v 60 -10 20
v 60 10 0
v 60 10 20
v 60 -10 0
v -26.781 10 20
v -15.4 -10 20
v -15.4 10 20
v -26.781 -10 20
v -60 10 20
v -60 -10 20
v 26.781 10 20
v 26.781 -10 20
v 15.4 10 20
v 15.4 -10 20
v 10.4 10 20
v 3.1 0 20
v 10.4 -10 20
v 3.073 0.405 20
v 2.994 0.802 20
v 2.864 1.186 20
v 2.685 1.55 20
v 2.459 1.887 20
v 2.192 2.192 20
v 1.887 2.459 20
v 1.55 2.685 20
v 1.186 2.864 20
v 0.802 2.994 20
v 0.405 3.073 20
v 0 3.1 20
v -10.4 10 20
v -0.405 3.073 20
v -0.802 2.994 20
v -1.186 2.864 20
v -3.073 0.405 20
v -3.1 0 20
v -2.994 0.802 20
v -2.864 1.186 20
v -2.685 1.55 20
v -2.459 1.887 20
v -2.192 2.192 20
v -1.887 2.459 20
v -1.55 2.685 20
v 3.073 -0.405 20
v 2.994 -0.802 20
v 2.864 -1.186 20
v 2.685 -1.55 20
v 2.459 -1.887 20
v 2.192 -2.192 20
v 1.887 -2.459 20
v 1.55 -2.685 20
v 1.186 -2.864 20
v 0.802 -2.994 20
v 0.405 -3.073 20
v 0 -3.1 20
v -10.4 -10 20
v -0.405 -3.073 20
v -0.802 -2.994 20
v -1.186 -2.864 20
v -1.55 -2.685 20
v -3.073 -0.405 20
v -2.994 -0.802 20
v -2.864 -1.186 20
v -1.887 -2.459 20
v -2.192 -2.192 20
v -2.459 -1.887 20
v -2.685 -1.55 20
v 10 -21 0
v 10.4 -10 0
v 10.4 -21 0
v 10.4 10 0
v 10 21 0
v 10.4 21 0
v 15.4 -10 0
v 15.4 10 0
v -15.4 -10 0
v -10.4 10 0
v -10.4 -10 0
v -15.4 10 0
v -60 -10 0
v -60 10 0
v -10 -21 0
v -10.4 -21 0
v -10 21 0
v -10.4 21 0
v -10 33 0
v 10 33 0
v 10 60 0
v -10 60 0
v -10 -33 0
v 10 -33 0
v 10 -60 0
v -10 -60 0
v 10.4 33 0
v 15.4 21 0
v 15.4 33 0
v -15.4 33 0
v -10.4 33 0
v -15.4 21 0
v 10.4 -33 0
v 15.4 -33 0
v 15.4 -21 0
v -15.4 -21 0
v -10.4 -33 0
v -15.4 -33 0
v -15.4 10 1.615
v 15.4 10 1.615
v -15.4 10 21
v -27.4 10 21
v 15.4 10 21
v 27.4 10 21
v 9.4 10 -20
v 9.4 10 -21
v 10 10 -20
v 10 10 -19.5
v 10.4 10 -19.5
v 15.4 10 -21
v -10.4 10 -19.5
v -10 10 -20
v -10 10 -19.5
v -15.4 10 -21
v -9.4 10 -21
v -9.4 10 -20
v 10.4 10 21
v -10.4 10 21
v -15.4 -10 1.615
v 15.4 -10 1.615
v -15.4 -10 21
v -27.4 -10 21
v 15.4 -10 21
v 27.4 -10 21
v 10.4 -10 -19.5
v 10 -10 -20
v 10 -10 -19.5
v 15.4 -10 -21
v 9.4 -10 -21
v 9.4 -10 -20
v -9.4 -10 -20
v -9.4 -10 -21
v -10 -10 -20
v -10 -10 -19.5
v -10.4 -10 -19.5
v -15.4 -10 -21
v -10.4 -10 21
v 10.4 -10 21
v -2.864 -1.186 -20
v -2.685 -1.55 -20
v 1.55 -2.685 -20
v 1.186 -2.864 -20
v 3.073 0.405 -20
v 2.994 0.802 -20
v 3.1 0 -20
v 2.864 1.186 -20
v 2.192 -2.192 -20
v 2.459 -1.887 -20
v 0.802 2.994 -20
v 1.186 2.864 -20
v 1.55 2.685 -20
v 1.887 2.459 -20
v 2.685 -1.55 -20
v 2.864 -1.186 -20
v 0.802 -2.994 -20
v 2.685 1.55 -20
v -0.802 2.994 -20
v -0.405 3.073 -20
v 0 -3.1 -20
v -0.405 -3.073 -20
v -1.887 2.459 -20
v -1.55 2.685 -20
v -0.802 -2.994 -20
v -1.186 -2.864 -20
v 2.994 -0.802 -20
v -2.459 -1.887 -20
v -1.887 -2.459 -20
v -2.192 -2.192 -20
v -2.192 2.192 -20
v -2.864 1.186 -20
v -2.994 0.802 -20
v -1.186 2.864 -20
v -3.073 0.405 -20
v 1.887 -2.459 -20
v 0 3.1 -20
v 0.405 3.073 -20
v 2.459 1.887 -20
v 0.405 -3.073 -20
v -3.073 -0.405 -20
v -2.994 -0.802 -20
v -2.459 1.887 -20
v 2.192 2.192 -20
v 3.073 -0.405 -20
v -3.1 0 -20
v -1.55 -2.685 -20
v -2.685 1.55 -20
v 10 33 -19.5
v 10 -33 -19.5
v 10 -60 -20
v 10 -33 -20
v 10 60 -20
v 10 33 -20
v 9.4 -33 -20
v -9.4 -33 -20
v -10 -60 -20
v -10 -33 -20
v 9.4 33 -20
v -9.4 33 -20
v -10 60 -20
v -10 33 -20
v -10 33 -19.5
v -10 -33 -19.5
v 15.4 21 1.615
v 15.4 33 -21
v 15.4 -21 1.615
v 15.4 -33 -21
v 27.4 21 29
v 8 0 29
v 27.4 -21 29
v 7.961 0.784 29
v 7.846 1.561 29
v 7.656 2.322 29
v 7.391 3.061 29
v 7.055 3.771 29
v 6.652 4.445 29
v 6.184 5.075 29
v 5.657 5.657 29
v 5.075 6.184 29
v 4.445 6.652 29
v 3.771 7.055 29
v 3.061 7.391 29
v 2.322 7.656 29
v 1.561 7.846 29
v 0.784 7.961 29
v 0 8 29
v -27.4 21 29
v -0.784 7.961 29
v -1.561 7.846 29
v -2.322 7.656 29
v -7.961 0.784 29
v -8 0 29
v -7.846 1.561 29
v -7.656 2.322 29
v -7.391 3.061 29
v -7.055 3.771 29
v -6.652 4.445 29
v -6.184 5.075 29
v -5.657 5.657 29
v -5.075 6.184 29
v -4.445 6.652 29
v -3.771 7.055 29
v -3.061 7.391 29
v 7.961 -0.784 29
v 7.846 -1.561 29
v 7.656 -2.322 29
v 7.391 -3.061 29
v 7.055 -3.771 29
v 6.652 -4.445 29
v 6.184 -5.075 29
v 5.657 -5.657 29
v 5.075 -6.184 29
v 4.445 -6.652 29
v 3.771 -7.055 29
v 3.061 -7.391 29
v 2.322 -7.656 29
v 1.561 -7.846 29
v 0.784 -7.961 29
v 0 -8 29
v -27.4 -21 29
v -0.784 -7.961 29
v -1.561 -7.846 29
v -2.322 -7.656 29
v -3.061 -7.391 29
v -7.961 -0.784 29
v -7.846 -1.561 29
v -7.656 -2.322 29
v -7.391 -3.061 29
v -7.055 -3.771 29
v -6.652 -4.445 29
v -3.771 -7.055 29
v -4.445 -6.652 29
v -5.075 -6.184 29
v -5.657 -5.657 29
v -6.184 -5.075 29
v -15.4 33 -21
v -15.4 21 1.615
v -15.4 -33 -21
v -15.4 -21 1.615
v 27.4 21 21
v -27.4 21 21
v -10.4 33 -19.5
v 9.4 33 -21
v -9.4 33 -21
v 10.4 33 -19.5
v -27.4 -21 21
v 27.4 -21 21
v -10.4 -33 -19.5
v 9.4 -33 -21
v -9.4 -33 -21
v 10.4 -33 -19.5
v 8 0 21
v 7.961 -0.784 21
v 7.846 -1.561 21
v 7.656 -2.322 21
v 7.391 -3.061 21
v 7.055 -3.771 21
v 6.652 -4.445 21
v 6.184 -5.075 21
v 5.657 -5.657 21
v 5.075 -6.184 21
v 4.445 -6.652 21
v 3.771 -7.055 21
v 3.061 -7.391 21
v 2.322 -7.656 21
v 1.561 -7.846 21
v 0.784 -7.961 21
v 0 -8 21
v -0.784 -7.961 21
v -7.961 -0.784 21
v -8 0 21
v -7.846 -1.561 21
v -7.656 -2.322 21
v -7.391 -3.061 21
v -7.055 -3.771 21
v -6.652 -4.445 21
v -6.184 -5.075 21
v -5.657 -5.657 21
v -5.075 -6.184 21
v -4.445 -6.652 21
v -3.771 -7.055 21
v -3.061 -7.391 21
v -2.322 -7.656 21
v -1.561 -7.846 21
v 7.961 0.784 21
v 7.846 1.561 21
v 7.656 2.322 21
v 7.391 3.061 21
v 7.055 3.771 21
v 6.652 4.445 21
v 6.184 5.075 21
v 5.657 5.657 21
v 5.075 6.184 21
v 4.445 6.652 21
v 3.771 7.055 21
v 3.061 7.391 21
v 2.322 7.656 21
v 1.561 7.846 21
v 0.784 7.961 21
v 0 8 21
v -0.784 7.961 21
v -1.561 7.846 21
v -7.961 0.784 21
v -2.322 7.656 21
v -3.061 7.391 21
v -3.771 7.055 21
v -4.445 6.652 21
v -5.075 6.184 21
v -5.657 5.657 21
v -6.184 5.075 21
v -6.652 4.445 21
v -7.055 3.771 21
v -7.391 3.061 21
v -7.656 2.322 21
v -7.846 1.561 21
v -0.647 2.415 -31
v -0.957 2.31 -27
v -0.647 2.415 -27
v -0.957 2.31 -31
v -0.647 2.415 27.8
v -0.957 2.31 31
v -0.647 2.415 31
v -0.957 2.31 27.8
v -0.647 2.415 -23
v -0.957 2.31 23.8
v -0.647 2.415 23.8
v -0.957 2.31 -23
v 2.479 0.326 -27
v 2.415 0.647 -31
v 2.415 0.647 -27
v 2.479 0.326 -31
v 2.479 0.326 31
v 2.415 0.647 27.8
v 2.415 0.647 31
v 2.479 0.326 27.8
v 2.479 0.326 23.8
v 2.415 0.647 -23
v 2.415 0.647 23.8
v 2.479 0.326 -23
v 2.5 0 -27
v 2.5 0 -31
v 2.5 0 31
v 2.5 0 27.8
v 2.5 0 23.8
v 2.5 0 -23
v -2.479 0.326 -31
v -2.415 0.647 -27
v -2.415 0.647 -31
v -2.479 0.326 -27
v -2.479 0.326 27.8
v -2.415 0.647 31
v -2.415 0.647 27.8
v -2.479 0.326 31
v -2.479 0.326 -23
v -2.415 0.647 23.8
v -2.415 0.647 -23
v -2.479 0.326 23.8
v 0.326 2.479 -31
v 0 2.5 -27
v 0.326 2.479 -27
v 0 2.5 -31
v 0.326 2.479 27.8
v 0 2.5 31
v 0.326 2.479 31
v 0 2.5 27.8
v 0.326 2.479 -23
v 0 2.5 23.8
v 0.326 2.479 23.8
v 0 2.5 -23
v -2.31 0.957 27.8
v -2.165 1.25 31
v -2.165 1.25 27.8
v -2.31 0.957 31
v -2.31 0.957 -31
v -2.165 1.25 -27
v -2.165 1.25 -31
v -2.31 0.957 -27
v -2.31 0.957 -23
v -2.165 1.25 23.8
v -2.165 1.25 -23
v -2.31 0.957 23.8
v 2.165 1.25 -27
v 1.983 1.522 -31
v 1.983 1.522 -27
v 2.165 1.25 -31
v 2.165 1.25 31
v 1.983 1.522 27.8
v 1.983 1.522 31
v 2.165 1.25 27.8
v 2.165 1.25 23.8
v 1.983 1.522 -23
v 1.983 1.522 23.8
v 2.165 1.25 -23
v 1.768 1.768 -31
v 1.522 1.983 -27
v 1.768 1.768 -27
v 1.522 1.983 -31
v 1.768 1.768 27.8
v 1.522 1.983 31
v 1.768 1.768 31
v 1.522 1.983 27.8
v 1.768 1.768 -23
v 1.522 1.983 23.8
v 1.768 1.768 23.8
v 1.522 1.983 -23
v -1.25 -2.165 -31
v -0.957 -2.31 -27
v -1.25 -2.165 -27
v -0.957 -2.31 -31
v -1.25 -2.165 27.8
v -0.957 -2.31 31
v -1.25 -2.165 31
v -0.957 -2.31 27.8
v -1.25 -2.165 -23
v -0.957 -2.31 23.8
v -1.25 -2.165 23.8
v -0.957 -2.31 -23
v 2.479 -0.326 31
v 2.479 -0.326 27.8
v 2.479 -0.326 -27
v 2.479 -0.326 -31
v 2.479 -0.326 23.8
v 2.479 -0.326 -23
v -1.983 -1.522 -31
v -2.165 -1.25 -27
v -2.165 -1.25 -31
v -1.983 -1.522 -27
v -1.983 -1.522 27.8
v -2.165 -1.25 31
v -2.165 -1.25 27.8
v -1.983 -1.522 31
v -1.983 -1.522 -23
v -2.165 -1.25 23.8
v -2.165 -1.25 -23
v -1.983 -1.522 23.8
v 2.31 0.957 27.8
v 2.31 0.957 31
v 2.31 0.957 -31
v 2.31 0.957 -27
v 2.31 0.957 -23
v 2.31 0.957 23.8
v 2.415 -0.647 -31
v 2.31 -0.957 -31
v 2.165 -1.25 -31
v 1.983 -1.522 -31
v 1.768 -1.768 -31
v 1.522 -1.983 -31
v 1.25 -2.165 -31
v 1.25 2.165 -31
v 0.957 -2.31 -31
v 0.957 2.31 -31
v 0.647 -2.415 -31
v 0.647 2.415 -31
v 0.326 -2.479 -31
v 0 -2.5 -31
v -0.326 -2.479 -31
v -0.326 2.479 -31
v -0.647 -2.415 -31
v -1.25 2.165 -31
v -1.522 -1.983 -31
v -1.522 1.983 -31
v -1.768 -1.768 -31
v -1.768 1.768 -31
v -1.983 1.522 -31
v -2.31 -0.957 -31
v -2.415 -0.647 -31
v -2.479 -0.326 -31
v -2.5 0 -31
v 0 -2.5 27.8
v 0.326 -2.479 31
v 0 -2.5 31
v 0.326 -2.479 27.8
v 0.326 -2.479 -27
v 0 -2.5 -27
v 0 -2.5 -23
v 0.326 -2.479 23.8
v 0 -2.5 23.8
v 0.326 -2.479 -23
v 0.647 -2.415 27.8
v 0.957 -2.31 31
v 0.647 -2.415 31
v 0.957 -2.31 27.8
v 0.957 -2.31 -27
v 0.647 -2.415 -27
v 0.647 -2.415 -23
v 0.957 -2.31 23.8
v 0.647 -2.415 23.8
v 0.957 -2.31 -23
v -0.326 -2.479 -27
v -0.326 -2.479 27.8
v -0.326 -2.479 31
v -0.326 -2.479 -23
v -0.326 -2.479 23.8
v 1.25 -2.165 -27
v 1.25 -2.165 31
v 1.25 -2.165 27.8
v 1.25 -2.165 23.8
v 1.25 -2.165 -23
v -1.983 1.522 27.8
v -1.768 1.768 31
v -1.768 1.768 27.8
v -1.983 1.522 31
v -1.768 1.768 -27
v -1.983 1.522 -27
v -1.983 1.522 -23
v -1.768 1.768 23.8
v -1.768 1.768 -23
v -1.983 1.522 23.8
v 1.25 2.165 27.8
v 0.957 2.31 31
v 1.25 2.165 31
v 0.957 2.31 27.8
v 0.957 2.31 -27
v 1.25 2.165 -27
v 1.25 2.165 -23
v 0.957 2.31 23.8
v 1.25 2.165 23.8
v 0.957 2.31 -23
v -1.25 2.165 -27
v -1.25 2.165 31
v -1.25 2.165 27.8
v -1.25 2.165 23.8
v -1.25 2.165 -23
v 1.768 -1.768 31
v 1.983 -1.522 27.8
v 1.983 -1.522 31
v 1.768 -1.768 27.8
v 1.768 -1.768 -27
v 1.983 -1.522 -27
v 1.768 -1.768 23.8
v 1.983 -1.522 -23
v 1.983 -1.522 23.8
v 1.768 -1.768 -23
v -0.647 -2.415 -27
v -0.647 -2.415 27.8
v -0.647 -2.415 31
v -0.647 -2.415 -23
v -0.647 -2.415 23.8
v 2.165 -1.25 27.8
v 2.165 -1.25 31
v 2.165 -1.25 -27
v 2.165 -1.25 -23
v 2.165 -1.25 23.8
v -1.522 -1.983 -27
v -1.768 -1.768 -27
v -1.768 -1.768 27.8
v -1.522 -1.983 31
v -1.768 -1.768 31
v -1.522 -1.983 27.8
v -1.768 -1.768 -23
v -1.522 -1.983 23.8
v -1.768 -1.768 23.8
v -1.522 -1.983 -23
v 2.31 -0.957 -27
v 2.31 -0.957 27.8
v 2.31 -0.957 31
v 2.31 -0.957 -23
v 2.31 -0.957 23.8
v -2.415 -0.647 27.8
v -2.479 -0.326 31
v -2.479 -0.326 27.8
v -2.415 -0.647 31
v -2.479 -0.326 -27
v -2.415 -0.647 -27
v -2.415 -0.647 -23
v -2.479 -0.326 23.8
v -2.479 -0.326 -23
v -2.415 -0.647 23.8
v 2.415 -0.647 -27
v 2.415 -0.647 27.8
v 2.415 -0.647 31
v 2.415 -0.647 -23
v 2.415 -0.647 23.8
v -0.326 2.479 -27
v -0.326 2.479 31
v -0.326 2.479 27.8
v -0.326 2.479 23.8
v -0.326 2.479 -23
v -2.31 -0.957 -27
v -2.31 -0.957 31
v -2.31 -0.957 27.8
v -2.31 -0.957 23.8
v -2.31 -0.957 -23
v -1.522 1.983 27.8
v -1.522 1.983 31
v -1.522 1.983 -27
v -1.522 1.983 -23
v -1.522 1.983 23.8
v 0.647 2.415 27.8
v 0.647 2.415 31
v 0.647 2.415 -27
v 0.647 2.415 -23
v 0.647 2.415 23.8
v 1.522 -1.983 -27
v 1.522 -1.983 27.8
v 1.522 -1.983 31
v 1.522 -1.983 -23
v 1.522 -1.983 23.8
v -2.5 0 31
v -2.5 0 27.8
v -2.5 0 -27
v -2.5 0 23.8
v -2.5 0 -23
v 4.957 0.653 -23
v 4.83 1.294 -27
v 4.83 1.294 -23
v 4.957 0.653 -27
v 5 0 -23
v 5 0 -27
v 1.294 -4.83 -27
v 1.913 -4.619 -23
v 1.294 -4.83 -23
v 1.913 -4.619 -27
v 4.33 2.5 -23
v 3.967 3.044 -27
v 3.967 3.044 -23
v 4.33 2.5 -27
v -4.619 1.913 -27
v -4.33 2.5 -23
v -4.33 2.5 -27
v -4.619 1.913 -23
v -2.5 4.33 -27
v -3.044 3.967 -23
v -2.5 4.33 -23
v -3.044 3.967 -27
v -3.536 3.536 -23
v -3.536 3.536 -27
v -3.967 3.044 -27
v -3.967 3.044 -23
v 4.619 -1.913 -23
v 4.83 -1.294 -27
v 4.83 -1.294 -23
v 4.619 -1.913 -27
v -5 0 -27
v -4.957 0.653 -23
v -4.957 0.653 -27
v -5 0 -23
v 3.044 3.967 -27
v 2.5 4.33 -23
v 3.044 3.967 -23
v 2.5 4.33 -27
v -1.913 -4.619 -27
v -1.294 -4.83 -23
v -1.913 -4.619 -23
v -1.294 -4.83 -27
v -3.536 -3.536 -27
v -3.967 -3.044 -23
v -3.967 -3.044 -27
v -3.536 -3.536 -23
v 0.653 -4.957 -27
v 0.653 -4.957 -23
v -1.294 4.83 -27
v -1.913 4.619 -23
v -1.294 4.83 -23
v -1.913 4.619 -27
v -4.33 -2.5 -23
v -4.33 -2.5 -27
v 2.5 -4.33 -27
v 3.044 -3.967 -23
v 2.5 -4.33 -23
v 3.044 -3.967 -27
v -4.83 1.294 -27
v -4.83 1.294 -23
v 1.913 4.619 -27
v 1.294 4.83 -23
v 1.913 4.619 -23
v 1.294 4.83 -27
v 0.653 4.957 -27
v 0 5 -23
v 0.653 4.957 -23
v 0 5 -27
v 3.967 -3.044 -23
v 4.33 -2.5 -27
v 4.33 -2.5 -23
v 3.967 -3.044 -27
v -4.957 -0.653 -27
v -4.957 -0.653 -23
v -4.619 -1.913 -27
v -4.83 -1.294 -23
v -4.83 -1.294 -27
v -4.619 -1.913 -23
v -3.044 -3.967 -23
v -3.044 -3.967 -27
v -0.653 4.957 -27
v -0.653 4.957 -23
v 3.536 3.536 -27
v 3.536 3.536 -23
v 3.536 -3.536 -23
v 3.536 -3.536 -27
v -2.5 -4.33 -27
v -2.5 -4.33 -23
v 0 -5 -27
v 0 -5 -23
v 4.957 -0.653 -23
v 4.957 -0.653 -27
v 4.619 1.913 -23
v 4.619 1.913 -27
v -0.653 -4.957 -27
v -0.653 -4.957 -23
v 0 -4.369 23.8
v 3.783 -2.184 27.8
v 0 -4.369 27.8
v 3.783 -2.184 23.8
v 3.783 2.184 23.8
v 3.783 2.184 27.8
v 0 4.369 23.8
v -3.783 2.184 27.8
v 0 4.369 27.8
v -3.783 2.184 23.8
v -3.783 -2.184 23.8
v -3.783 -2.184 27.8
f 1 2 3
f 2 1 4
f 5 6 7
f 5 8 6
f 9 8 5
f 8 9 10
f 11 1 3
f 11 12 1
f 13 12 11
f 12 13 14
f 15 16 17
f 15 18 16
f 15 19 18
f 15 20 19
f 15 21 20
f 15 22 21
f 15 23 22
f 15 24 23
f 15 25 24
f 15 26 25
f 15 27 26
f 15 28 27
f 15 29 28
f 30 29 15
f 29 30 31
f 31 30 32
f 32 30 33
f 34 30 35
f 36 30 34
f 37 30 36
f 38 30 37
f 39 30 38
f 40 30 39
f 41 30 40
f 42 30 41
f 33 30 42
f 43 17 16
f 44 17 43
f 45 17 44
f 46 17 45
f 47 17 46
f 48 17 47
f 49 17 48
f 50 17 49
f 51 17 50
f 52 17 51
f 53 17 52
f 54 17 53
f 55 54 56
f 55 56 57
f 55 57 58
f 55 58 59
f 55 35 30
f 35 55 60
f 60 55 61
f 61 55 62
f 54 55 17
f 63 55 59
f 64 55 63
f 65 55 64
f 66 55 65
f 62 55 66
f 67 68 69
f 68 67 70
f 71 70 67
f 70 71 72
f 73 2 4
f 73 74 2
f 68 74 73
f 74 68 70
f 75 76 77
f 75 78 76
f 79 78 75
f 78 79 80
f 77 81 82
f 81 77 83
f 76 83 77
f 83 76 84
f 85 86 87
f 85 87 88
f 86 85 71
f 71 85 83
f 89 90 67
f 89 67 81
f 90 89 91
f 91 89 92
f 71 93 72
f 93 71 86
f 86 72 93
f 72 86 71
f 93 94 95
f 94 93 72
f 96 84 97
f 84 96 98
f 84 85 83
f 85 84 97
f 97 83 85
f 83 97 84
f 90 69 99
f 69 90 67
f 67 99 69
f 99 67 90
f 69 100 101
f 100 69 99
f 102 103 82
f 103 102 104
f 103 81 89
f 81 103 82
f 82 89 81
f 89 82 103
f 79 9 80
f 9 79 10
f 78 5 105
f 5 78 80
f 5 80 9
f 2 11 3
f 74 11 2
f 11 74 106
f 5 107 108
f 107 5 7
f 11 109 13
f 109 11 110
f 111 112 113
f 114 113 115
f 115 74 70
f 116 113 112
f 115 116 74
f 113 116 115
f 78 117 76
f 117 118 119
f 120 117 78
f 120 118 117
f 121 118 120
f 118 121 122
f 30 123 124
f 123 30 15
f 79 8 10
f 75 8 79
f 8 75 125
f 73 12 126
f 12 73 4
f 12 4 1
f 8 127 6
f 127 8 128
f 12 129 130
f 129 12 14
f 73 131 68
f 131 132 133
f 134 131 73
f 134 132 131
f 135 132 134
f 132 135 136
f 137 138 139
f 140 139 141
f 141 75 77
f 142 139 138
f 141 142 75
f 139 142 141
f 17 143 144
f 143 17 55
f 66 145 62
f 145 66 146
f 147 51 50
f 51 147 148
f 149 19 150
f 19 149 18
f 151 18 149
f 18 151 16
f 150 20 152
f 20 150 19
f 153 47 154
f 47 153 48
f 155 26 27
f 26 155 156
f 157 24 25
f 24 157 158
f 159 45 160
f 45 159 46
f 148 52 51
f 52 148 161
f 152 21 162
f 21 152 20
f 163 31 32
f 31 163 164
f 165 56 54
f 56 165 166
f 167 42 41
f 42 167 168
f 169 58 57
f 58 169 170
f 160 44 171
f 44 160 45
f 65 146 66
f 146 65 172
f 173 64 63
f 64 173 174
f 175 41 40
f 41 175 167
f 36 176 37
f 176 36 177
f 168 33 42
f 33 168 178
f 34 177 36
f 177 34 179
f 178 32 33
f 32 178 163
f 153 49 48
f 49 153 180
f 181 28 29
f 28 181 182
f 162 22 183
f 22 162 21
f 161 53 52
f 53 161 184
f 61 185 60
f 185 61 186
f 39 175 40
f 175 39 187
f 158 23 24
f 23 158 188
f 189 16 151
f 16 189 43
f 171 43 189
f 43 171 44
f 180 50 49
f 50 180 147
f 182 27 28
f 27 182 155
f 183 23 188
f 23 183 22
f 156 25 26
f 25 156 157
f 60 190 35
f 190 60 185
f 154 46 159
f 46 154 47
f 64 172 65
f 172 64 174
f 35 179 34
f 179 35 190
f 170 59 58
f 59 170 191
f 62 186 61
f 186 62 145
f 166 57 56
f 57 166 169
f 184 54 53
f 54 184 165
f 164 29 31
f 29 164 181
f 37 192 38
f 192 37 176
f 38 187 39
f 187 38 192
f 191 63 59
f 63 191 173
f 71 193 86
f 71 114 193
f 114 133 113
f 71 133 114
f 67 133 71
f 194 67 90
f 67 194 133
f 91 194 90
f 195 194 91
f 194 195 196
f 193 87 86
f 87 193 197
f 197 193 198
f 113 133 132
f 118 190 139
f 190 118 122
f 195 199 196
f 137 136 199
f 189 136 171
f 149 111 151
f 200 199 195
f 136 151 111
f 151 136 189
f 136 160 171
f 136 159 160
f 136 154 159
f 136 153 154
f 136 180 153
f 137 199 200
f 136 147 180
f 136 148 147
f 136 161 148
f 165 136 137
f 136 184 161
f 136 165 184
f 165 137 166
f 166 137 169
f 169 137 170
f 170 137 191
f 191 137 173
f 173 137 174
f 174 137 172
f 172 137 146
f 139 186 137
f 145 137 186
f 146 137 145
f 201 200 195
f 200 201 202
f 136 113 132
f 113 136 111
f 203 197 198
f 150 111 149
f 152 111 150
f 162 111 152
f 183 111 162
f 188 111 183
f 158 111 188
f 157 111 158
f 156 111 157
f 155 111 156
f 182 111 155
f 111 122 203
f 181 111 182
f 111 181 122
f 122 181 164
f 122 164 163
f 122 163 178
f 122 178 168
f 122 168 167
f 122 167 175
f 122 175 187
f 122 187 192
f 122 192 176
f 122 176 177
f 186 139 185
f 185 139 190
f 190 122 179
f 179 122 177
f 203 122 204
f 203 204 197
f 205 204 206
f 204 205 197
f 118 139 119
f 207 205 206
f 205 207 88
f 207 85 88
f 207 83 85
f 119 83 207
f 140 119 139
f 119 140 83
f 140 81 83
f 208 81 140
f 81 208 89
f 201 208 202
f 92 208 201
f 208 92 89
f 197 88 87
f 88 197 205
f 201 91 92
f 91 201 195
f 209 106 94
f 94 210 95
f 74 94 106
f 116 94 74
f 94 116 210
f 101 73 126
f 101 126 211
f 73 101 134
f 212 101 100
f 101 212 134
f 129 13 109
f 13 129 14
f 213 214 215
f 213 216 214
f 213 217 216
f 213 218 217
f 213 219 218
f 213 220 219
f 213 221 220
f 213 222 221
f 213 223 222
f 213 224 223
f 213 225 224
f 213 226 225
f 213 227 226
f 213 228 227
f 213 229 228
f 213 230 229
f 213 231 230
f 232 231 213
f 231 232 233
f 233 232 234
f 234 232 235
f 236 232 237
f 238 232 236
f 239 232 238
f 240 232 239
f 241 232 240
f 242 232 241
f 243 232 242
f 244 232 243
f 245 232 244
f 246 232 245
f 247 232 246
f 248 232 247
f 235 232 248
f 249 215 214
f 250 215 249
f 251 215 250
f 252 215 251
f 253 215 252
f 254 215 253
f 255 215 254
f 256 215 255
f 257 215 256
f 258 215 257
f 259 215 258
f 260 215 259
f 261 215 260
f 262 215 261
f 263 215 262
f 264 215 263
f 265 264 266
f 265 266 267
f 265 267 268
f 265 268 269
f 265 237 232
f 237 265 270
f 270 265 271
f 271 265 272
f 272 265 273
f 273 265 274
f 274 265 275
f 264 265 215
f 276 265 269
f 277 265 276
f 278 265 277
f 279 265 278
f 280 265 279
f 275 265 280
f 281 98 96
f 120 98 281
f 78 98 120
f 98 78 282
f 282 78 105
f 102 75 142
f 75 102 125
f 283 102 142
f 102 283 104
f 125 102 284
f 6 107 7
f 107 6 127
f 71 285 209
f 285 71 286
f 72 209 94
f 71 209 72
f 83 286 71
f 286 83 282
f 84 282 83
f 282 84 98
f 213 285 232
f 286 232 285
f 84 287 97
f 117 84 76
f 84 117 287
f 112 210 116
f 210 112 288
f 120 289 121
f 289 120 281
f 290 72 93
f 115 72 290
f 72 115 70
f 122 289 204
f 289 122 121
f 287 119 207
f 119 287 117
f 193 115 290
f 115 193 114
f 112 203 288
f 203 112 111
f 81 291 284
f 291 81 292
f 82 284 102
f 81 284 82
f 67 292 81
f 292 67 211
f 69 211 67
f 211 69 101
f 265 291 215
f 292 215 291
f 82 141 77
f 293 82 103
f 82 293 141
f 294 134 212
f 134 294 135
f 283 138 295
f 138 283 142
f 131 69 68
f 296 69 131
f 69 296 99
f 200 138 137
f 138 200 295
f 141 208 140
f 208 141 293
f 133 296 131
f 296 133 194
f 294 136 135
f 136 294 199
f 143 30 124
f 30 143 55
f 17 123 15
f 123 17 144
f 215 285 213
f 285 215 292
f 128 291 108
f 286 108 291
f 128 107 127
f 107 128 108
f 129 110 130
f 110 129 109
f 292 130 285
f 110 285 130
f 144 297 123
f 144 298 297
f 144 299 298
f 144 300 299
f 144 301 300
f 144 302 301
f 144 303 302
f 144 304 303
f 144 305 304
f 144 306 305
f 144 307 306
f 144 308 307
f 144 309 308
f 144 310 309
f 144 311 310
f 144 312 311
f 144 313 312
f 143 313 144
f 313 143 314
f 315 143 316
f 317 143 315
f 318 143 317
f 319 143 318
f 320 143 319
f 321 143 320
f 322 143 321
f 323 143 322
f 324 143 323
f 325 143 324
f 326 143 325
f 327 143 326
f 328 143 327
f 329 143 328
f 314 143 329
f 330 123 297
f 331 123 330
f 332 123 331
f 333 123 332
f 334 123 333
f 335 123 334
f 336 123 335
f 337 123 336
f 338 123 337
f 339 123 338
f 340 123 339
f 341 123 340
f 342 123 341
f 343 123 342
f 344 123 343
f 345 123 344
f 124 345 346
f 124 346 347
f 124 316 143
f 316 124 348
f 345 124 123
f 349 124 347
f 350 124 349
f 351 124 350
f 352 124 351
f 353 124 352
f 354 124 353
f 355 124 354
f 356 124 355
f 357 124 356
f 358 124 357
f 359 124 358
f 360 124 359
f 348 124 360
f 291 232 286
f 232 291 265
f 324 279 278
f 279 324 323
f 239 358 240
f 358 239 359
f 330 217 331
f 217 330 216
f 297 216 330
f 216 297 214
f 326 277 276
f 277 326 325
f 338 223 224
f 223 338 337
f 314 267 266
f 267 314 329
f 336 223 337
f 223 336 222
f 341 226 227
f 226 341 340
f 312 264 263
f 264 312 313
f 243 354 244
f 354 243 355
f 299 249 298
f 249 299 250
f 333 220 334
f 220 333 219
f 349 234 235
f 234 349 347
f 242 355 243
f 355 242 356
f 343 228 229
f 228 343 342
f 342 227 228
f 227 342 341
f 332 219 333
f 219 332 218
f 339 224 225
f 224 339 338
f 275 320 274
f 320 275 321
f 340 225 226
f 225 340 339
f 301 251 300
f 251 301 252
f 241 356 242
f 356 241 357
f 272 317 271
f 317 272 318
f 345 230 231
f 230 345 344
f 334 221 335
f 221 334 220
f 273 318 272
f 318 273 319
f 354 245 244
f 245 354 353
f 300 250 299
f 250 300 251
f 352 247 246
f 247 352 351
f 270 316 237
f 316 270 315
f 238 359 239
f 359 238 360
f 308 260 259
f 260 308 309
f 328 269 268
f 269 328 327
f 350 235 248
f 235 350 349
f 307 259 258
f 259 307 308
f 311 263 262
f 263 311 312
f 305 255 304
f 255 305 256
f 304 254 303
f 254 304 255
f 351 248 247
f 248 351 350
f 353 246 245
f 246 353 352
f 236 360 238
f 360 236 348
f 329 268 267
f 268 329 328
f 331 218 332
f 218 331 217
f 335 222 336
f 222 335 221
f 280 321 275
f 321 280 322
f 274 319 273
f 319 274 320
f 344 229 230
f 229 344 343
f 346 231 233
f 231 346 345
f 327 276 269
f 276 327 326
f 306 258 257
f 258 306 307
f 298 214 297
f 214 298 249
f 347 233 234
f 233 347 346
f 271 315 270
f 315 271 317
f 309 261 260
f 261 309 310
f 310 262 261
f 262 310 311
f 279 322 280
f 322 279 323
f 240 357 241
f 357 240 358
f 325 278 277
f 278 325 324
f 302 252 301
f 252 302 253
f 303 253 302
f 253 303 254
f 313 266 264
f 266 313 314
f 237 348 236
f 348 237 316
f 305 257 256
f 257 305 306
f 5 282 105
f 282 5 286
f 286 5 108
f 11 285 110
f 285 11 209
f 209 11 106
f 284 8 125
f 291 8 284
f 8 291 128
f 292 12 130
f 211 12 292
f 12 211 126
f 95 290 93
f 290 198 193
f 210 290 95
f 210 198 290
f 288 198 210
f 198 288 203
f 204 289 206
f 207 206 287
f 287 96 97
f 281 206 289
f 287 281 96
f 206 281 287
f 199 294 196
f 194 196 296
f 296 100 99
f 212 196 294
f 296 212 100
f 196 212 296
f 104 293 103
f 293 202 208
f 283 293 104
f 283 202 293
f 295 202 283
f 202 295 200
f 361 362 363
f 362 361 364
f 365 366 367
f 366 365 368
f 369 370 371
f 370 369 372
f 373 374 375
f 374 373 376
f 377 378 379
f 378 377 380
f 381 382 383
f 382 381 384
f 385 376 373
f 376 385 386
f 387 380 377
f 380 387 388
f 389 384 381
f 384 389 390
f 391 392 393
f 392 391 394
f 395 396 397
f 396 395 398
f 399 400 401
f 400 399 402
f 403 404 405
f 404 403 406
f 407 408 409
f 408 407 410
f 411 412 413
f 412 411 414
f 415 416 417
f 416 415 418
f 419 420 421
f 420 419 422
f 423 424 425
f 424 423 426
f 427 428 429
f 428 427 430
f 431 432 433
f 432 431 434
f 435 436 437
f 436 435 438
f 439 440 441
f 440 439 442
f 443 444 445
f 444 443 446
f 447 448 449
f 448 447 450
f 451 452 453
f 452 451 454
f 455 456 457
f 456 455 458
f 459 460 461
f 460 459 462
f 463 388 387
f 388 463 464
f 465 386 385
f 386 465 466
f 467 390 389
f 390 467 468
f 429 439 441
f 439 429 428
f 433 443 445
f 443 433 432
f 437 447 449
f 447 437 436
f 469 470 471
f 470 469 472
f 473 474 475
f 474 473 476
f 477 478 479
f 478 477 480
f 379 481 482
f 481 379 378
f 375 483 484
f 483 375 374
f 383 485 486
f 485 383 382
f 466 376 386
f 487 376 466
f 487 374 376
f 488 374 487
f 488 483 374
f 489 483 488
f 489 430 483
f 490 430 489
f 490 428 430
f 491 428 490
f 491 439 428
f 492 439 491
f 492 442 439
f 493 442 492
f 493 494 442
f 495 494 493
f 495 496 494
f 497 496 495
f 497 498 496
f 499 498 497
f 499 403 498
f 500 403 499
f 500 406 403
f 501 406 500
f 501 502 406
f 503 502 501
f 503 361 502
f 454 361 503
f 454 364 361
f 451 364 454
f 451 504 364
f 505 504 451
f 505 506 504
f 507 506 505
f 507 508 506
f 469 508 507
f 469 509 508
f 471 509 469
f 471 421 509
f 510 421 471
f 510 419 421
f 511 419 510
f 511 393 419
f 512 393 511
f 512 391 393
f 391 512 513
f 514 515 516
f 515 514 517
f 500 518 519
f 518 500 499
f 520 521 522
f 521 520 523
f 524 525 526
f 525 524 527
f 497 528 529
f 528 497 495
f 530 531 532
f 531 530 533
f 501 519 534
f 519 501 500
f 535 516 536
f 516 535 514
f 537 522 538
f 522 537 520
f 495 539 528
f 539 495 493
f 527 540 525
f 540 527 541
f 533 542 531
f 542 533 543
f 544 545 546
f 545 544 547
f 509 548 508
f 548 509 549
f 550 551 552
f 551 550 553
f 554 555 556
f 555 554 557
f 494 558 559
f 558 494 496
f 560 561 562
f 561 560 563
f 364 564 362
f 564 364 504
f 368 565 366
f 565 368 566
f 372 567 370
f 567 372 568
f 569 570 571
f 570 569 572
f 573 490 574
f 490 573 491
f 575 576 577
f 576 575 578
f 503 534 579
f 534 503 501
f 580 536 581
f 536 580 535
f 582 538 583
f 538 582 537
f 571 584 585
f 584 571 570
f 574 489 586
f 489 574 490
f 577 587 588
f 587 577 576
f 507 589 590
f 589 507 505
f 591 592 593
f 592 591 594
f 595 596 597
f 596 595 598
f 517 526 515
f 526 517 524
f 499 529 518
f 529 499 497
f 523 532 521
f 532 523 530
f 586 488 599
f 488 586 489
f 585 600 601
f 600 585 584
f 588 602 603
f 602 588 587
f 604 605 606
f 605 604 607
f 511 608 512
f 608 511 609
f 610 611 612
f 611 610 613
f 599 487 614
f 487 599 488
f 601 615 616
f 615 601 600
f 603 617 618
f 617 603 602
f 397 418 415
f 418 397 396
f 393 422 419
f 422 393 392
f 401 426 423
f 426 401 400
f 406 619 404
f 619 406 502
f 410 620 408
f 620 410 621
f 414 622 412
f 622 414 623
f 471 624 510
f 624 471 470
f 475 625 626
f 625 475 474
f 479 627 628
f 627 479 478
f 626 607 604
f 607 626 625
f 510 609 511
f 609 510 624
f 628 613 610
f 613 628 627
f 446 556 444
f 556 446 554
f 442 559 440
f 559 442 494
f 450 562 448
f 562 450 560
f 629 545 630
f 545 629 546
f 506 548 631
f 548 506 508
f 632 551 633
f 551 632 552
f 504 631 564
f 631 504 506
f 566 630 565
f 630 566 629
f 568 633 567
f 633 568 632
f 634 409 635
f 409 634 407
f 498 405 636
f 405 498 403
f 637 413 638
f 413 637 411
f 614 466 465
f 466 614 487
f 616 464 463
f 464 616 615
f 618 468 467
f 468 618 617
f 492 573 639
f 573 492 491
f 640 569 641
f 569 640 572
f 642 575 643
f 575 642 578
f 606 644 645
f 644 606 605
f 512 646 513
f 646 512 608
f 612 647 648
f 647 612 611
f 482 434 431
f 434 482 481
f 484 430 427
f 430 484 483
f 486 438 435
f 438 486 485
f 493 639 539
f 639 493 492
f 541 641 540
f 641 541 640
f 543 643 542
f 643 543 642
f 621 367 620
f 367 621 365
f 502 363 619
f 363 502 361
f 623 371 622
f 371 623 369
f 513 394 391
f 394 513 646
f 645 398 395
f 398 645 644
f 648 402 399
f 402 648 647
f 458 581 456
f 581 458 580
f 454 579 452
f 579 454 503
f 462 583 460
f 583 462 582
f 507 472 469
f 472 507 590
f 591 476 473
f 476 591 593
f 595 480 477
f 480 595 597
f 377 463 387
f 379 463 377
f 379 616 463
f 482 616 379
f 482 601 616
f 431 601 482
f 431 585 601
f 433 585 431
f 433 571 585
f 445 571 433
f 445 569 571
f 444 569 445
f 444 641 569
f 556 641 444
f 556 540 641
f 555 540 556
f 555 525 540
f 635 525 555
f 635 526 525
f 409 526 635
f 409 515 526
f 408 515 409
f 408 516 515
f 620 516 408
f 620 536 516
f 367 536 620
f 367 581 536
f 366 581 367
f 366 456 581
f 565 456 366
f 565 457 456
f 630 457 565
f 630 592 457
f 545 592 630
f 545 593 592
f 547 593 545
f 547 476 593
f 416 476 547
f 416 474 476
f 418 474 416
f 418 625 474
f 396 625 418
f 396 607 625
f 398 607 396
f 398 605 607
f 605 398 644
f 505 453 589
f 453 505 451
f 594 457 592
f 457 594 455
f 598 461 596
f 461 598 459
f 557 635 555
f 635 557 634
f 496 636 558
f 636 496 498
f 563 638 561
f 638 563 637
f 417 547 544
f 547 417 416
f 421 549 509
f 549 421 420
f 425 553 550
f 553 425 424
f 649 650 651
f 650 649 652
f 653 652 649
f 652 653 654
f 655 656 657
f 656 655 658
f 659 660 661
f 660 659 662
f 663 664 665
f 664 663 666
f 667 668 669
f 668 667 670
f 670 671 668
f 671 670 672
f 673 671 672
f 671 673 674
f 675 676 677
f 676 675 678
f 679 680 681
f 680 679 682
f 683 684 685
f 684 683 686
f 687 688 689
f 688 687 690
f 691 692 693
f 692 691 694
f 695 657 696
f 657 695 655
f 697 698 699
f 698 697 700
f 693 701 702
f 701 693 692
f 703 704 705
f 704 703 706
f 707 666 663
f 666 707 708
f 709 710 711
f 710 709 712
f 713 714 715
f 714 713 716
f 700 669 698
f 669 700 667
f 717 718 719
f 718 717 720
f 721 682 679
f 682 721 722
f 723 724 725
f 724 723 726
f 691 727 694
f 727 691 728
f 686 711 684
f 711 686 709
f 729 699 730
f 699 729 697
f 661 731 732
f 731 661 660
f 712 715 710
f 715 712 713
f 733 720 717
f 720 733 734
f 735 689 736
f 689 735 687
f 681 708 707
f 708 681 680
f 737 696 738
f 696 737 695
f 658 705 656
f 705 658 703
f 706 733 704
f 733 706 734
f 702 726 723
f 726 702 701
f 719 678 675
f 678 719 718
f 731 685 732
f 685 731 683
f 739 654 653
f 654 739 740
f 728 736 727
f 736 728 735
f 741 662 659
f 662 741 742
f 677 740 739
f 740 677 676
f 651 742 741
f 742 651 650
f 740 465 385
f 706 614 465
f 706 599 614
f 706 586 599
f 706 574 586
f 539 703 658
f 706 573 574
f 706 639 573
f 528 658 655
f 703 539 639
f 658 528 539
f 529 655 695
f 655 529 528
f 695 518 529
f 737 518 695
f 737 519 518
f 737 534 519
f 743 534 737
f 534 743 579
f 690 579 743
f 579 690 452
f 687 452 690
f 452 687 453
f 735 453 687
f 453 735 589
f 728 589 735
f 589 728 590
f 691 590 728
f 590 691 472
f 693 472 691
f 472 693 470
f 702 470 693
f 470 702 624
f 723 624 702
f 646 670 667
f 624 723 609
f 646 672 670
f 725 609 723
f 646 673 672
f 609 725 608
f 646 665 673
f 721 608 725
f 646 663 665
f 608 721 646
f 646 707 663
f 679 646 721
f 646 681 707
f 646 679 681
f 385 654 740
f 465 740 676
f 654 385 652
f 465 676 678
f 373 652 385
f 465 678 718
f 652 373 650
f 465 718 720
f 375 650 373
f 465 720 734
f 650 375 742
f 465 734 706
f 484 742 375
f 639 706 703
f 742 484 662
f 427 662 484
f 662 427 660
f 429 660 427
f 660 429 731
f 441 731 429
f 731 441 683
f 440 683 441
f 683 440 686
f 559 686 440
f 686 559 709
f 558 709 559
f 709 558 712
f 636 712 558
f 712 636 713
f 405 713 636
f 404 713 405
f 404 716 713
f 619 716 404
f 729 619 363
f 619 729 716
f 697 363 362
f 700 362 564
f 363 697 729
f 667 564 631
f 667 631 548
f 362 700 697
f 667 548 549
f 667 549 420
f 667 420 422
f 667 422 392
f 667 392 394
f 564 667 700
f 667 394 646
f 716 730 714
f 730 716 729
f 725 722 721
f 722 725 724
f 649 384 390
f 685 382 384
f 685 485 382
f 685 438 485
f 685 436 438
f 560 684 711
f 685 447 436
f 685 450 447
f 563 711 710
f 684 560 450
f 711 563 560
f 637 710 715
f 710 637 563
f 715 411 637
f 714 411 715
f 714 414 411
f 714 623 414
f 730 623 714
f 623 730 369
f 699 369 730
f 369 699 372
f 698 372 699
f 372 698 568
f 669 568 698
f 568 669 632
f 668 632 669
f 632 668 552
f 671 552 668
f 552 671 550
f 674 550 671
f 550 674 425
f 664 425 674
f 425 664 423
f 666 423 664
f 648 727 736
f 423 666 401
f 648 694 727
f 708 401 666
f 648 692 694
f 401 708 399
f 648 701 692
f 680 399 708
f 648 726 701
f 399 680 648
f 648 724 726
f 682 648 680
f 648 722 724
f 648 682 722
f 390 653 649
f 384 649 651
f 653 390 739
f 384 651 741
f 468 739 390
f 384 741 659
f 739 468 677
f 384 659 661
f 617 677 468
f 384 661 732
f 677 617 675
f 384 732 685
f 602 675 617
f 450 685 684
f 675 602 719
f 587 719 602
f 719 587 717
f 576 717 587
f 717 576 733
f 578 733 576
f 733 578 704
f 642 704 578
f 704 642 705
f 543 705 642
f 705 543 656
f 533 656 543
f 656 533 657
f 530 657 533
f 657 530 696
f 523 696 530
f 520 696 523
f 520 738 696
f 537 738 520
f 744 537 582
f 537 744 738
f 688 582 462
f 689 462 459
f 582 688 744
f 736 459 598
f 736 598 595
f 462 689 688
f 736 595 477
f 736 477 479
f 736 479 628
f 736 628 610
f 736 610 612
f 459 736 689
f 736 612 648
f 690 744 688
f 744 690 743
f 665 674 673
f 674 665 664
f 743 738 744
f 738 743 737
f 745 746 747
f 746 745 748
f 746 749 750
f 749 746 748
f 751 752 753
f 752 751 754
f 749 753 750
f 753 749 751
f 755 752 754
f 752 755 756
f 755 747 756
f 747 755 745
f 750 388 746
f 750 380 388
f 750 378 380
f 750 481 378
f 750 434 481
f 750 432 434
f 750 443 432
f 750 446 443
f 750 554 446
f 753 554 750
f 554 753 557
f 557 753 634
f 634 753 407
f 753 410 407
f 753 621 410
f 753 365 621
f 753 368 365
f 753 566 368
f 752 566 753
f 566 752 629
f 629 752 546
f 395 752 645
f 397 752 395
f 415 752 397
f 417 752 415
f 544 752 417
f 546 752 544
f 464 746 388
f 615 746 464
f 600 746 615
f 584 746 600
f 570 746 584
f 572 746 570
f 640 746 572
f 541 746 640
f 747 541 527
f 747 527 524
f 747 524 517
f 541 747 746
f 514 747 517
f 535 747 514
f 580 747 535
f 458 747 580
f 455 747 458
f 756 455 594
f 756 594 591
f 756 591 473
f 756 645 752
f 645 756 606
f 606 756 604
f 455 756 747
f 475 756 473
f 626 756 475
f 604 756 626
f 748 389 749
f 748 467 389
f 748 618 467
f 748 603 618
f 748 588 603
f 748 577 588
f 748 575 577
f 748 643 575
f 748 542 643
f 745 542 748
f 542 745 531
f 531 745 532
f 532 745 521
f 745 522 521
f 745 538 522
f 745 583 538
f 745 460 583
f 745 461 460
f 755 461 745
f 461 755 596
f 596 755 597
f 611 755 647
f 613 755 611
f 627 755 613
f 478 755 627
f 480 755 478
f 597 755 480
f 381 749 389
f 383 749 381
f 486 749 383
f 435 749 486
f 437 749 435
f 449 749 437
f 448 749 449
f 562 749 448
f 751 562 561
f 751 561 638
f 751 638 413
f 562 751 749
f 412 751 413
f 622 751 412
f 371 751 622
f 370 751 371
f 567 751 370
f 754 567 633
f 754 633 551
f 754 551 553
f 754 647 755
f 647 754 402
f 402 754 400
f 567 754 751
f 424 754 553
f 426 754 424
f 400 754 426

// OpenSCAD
// file: ../perpendicular-u-joint-guard-v1.4-full-nut-passage/full_nut_passage_guard.scad
// v1.4: keep the exact v1.3 body; remove the nut-pocket floor with one
// full-depth Ø16 cylindrical subtraction. Units: mm; Z positive upwards.
// Imported v1.3 geometry contains all four triangles and the lower hooks.
use <../perpendicular-u-joint-guard-v1.3-triangular-corner-fills/candidate_triangular_corner_fills.scad>;

$fn = 48;
PART = "clip";
nut_passage_d = 16.0;

module full_depth_nut_passage() {
    // Cutter extends z=-31..39, past the whole printed z=-21..29 envelope.
    // 64 facets match the existing Ø16 pocket, avoiding a stepped profile.
    translate([0, 0, 4])
        cylinder(d = nut_passage_d, h = 70, center = true, $fn = 64);
}

module guard_v1_4() {
    difference() {
        candidate_print_solid();
        full_depth_nut_passage();
    }
}

guard_v1_4();
// file: ../perpendicular-u-joint-guard-v1.3-triangular-corner-fills/candidate_triangular_corner_fills.scad
// Candidate v1.3: four triangular concave-corner fill blocks.
//
// Base: accepted v0.7 eaves12 geometry. v0.9/v1.0/v1.1/v1.2 are not
// imported. Each corner block is a real triangular prism: broad at the roof,
// tapering continuously toward z=0, and overlapping the U side wall.

use <../perpendicular-u-joint-guard-v0.7/perpendicular_double_u_guard.scad>;

$fn = 48;
PART = "candidate_iso";

// Explicit v0.7 interface values.
roof_x_outer = 27.4;       // accepted eaves12 roof: -27.4..+27.4
side_wall_x_outer = 15.4;  // existing side-wall outer edge
blue_tube_x_outer = 10.0;  // blue lower 20x20 tube half-width
plate_y_inner = 10.0;
plate_y_outer = 21.0;
plate_depth_y = plate_y_outer - plate_y_inner; // 11 mm per front/back U plate

// The top edge is 0.5 mm inside the roof volume (roof underside z=21), and
// the lower point enters the side wall by 1 mm in X.  The XZ area therefore
// has positive overlap at both ends, not edge-only contact.
triangle_top_z = 21.5;
triangle_bottom_z = 0.0;
triangle_roof_overlap_z = triangle_top_z - 21.0;
triangle_side_overlap_x = 1.0;
triangle_inner_x = side_wall_x_outer - triangle_side_overlap_x; // 14.4

// Bottom retaining-hook contract copied from v0.7 for explicit verification.
hook_height_z = 1.5;
u_bottom_z = -21.0;
hook_top_z = u_bottom_z + hook_height_z; // -19.5

assert(plate_depth_y == 11, "每个三角块的前后板深必须是 11 mm");
assert(triangle_top_z > 21 && triangle_bottom_z == 0,
       "三角块上端必须搭入屋檐、下端落到 z=0");
assert(triangle_inner_x > blue_tube_x_outer,
       "三角块下端不得进入蓝色方管 x=-10..+10 包络");
assert(triangle_side_overlap_x > 0 && triangle_roof_overlap_z > 0,
       "三角块必须与屋檐和侧墙都有正重叠");
assert(hook_height_z == 1.5 && u_bottom_z == -21 && hook_top_z == -19.5,
       "底部卡脚必须保持 z=-21..-19.5");

// A polygon in XZ is extruded only through the corresponding front/back U
// plate. The center y=-10..+10 passage remains open.
module triangular_fill_xz(points, yc) {
    translate([0, yc, 0])
        rotate([90, 0, 0])
            linear_extrude(height = plate_depth_y,
                           center = true,
                           convexity = 10)
                polygon(points = points);
}

module front_neg_x_triangle() {
    // -X roof end -> +X inward. Top wide, lower point at the side wall.
    triangular_fill_xz([
        [-roof_x_outer, 21.0],
        [-triangle_inner_x, triangle_top_z],
        [-triangle_inner_x, triangle_bottom_z]
    ], (plate_y_inner + plate_y_outer) / 2);
}

module front_pos_x_triangle() {
    // +X roof end -> -X inward. Mirrored triangle.
    triangular_fill_xz([
        [roof_x_outer, 21.0],
        [triangle_inner_x, triangle_top_z],
        [triangle_inner_x, triangle_bottom_z]
    ], (plate_y_inner + plate_y_outer) / 2);
}

module back_neg_x_triangle() {
    triangular_fill_xz([
        [-roof_x_outer, 21.0],
        [-triangle_inner_x, triangle_top_z],
        [-triangle_inner_x, triangle_bottom_z]
    ], -(plate_y_inner + plate_y_outer) / 2);
}

module back_pos_x_triangle() {
    triangular_fill_xz([
        [roof_x_outer, 21.0],
        [triangle_inner_x, triangle_top_z],
        [triangle_inner_x, triangle_bottom_z]
    ], -(plate_y_inner + plate_y_outer) / 2);
}

module front_two_triangular_fills() {
    union() {
        front_neg_x_triangle();
        front_pos_x_triangle();
    }
}

module back_two_triangular_fills() {
    union() {
        back_neg_x_triangle();
        back_pos_x_triangle();
    }
}

module all_four_triangular_fills() {
    union() {
        front_two_triangular_fills();
        back_two_triangular_fills();
    }
}

module candidate_print_solid() {
    // Final hole operation is deliberately after the complete four-block
    // union; this preserves a true Z through-hole and the round nut pocket.
    difference() {
        union() {
            double_u_clip();
            all_four_triangular_fills();
        }
        vertical_screw_relief();
    }
}

module candidate_clip() {
    candidate_print_solid();
}

module candidate_assembly_iso() {
    upper_long_tube();
    lower_cross_tube();
    color([0.96, 0.39, 0.08]) double_u_clip();
    color([0.86, 0.13, 0.08]) front_two_triangular_fills();
    color([0.62, 0.12, 0.52]) back_two_triangular_fills();
    vertical_joint_screw();
}

module candidate_front_xz() {
    lower_cross_tube();
    color([0.96, 0.39, 0.08]) double_u_clip();
    color([0.86, 0.13, 0.08]) front_two_triangular_fills();
    vertical_joint_screw();
}

module candidate_back_xz() {
    lower_cross_tube();
    color([0.96, 0.39, 0.08]) double_u_clip();
    color([0.62, 0.12, 0.52]) back_two_triangular_fills();
    vertical_joint_screw();
}

module candidate_top_slice() {
    // At z=-0.5..2.5 the four blocks show their two front/back 11 mm bands;
    // the blue tube and the central y gap remain visible.
    slice_box = 200;
    color([0.28, 0.45, 0.78])
        intersection() {
            lower_cross_tube();
            translate([-slice_box / 2, -slice_box / 2, -0.5])
                cube([slice_box, slice_box, 3.0]);
        }
    color([0.96, 0.39, 0.08])
        intersection() {
            double_u_clip();
            translate([-slice_box / 2, -slice_box / 2, -0.5])
                cube([slice_box, slice_box, 3.0]);
        }
    color([0.86, 0.13, 0.08])
        intersection() {
            front_two_triangular_fills();
            translate([-slice_box / 2, -slice_box / 2, -0.5])
                cube([slice_box, slice_box, 3.0]);
        }
    color([0.62, 0.12, 0.52])
        intersection() {
            back_two_triangular_fills();
            translate([-slice_box / 2, -slice_box / 2, -0.5])
                cube([slice_box, slice_box, 3.0]);
        }
}

module candidate_hole_section() {
    // Center y=0 section: the bore and round nut pocket are shown without
    // confusing them with the bottom hook, which is outside this section.
    intersection() {
        candidate_print_solid();
        translate([-100, -0.4, -100]) cube([200, 0.8, 200]);
    }
}

module candidate_hook_check() {
    // Isolated lower detail: exact imported v0.7 U plate and blue tube, with
    // hook volumes highlighted only for review. This is not the print union.
    detail_box = 200;
    detail_z0 = -22;
    detail_h = 5;
    detail_y0 = 8;
    detail_ydepth = 15;
    intersection() {
        lower_cross_tube();
        translate([-detail_box / 2, detail_y0, detail_z0])
            cube([detail_box, detail_ydepth, detail_h]);
    }
    color([0.96, 0.39, 0.08])
        intersection() {
            u_plate(plate_y_inner, plate_y_outer);
            translate([-detail_box / 2, detail_y0, detail_z0])
                cube([detail_box, detail_ydepth, detail_h]);
        }
    color([0.20, 0.78, 0.20])
        intersection() {
            union() {
                translate([-13.65, 15.5, -20.25])
                    cube([3.5, 11, 1.5], center = true);
                translate([13.65, 15.5, -20.25])
                    cube([3.5, 11, 1.5], center = true);
            }
            translate([-detail_box / 2, detail_y0, detail_z0])
                cube([detail_box, detail_ydepth, detail_h]);
        }
}

if (PART == "candidate_clip") {
    candidate_clip();
} else if (PART == "candidate_front_xz") {
    candidate_front_xz();
} else if (PART == "candidate_back_xz") {
    candidate_back_xz();
} else if (PART == "candidate_top_slice") {
    candidate_top_slice();
} else if (PART == "candidate_hole_section") {
    candidate_hole_section();
} else if (PART == "candidate_hook_check") {
    candidate_hook_check();
} else {
    candidate_assembly_iso();
}
// file: ../perpendicular-u-joint-guard-v1.5-vertical-tube-clearance/vertical_tube_clearance_guard.scad
// v1.5: v1.4 Ø16 full nut passage + minimum downward-entry upper-tube slot.
// Units mm. X: upper long tube; Y: blue foot/front-back; Z: up.
use <../perpendicular-u-joint-guard-v1.4-full-nut-passage/full_nut_passage_guard.scad>;

$fn = 48;

module upper_pipe_vertical_entry_slot() {
    // Fixed gray upper tube: x=-60..60, y=-10..10, z=0..20.
    // While the clip moves down, that tube sweeps upward in clip coordinates.
    // A bottom-open slot ending at z=20 covers its whole relevant sweep in
    // the printed z=-21..29 envelope. Roof underside remains at z=21.
    // Preserve exact 20 mm Y width rather than silently adding fit clearance.
    translate([-60, -10, -31]) cube([120, 20, 51]);
}

module guard_v1_5() {
    difference() {
        guard_v1_4();
        upper_pipe_vertical_entry_slot();
    }
}

guard_v1_5();
// file: lower_y_extension_guard.scad
// v1.6 candidate, mm. Extend only the lower U arms and retaining hooks.
// Interpretation of 'from the bottom upwards': z=-21..0 (blue foot top).
// Front outer face +21 -> +33; rear outer face -21 -> -33, 12 mm each.
// The v1.5 body, triangle XZ profiles and existing snap hooks are inherited.
use <../perpendicular-u-joint-guard-v1.5-vertical-tube-clearance/vertical_tube_clearance_guard.scad>;
use <../perpendicular-u-joint-guard-v1.4-full-nut-passage/full_nut_passage_guard.scad>;
use <../perpendicular-u-joint-guard-v0.7/perpendicular_double_u_guard.scad>;

$fn = 48;
y_outward_extension = 12;
lower_extension_bottom_z = -21;
lower_extension_top_z = 0;
extension_joint_overlap = 0.1;

module lower_extension_band(y0, y1) {
    // Reuse the real v0.7 U cross-section, including its 1.5 mm hook.
    // Clipping to z<=0 excludes the upper web, roof and corner triangles.
    intersection() {
        u_plate(y0, y1);
        translate([-40, -50, lower_extension_bottom_z])
            cube([80, 100, lower_extension_top_z - lower_extension_bottom_z]);
    }
}

module lower_y_extensions() {
    lower_extension_band(21 - extension_joint_overlap, 21 + y_outward_extension);
    lower_extension_band(-21 - y_outward_extension, -21 + extension_joint_overlap);
}

module guard_v1_6() {
    difference() {
        union() {
            guard_v1_5();
            lower_y_extensions();
        }
        // Final operations keep the accepted full-depth nut passage and the
        // v1.5 rigid upper-tube entry clearance authoritative.
        full_depth_nut_passage();
        upper_pipe_vertical_entry_slot();
    }
}

guard_v1_6();
// main file
// v1.6 review only: actual SCAD geometry, dimensions and Boolean diagnostics.
use <lower_y_extension_guard.scad>;
use <../perpendicular-u-joint-guard-v1.5-vertical-tube-clearance/vertical_tube_clearance_guard.scad>;
use <../perpendicular-u-joint-guard-v1.3-triangular-corner-fills/candidate_triangular_corner_fills.scad>;
use <../perpendicular-u-joint-guard-v0.7/perpendicular_double_u_guard.scad>;

$fn = 48;
VIEW = "assembly";

module added_material() { difference() { guard_v1_6(); guard_v1_5(); } }
module colored_part() {
    color([0.96, 0.39, 0.08]) guard_v1_5();
    color([0.16, 0.65, 0.33]) added_material();
}
module assembly(candidate = true) {
    upper_long_tube();
    lower_cross_tube();
    if (candidate) colored_part();
    else color([0.96, 0.39, 0.08]) guard_v1_5();
    vertical_joint_screw();
}
module yz_slice(x = 13) {
    intersection() {
        children();
        translate([x - 0.025, -65, -32]) cube([0.05, 130, 70]);
    }
}
module label_yz(value, y, z, size = 3.0, c = [0.1, 0.12, 0.15]) {
    color(c) translate([14, y, z]) rotate([90, 0, 90])
        linear_extrude(height = 0.1)
            text(value, font = "Arial Unicode MS", size = size,
                 halign = "left", valign = "center");
}
module line_yz(a, b, c = [0.18, 0.2, 0.23], d = 0.22) {
    color(c) hull() {
        translate([14, a[0], a[1]]) sphere(d = d, $fn = 12);
        translate([14, b[0], b[1]]) sphere(d = d, $fn = 12);
    }
}
module y_dimension(a, b, z, caption) {
    line_yz([a,z],[b,z]);
    line_yz([a,z-1],[a,z+1]);
    line_yz([b,z-1],[b,z+1]);
    label_yz(caption, (a+b)/2-5, z-3, 2.8);
}
module side_dimensions(candidate = true, title = true) {
    color([0.96, 0.39, 0.08]) yz_slice() guard_v1_5();
    if (candidate) color([0.16, 0.65, 0.33]) yz_slice() added_material();
    color([0.58, 0.61, 0.66]) yz_slice() upper_long_tube();
    if (title) {
        label_yz("v1.6 底部 Y 向对称延伸  /  X=13 剖面", -43, 43, 3.7);
        label_yz("绿色：仅 Z=-21..0；上方三角块与屋檐沿用 v1.5", -43, 36, 2.7);
    }
    if (candidate) {
        y_dimension(-33,-21,-28,"12 mm");
        y_dimension(21,33,-28,"12 mm");
        line_yz([-38,-21],[-38,0]);
        line_yz([-39,-21],[-37,-21]);
        line_yz([-39,0],[-37,0]);
        label_yz("Z=0",-49,0,2.8);
        label_yz("Z=-21",-51,-21,2.8);
        label_yz("高度 21",-54,-10,2.8);
    }
    label_yz("-Y BACK",-32,-38,2.8);
    label_yz("+Y FRONT",21,-38,2.8);
}
module comparison() {
    translate([0,-63,0]) {
        side_dimensions(false, false);
        label_yz("基线 v1.5", -30, 39, 4);
        y_dimension(-21,21,-28,"原外宽 42 mm");
    }
    translate([0,63,0]) {
        side_dimensions(true, false);
        label_yz("候选 v1.6", -30, 39, 4);
        label_yz("下部外宽 66 mm", -24, 32, 3);
    }
}
module bottom_dimensions() {
    // Top-down slice through the true lower hooks at z=-20.25.
    color([0.96, 0.39, 0.08]) intersection() {
        guard_v1_5();
        translate([-40,-50,-20.5]) cube([80,100,0.5]);
    }
    color([0.16, 0.65, 0.33]) intersection() {
        added_material();
        translate([-40,-50,-20.5]) cube([80,100,0.5]);
    }
    color([0.28, 0.45, 0.78]) intersection() {
        lower_cross_tube();
        translate([-10,-60,-20]) cube([20,120,0.1]);
    }
    // All labels are actual SCAD text, rendered above the clipped geometry.
    for (entry = [
        ["v1.6 底扣层俯视：前后各加 12 mm",-45,48,3.4],
        ["-33",20,-33,2.9], ["-21",20,-21,2.9],
        ["+21",20,21,2.9], ["+33",20,33,2.9],
        ["中央 Y=-10..+10 保持 20 mm",-43,-48,3.0]
    ]) color([0.1,0.12,0.15]) translate([entry[1],entry[2],-18])
        linear_extrude(height=0.1)
            text(entry[0],font="Arial Unicode MS",size=entry[3],valign="center");
}
module all_hook_regions() {
    // Original hook cross-section, now continuous from y=10..33 on each side.
    for (yc=[-21.5,21.5]) for(xc=[-11.15,11.15])
        translate([xc,yc,-20.25]) cube([3.5,23,1.5],center=true);
}

if (VIEW == "assembly") assembly();
else if (VIEW == "side") side_dimensions();
else if (VIEW == "comparison") comparison();
else if (VIEW == "bottom") bottom_dimensions();
else if (VIEW == "clip") guard_v1_6();
else if (VIEW == "passage_obstruction") {
    intersection() {
        guard_v1_6();
        translate([0,0,4]) cylinder(d=15.999,h=70,center=true,$fn=64);
    }
} else if (VIEW == "upper_motion_obstruction") {
    intersection() {
        guard_v1_6();
        hull() { upper_long_tube(); translate([0,0,-52]) upper_long_tube(); }
    }
} else if (VIEW == "nut_motion_obstruction") {
    intersection() {
        guard_v1_6();
        hull() { vertical_joint_screw(); translate([0,0,-52]) vertical_joint_screw(); }
    }
} else if (VIEW == "rigid_lower_motion_obstruction") {
    intersection() {
        difference() { guard_v1_6(); all_hook_regions(); }
        hull() { lower_cross_tube(); translate([0,0,-52]) lower_cross_tube(); }
    }
} else if (VIEW == "baseline_material_removed") {
    difference() { guard_v1_5(); guard_v1_6(); }
} else if (VIEW == "upper_geometry_changed") {
    intersection() {
        difference() { guard_v1_6(); guard_v1_5(); }
        translate([-100,-100,0.001]) cube([200,200,100]);
    }
} else if (VIEW == "triangles_changed") {
    difference() { all_four_triangular_fills(); guard_v1_6(); }
} else if (VIEW == "mirror_difference") {
    union() {
        difference() { guard_v1_6(); mirror([0,1,0]) guard_v1_6(); }
        difference() { mirror([0,1,0]) guard_v1_6(); guard_v1_6(); }
    }
}
